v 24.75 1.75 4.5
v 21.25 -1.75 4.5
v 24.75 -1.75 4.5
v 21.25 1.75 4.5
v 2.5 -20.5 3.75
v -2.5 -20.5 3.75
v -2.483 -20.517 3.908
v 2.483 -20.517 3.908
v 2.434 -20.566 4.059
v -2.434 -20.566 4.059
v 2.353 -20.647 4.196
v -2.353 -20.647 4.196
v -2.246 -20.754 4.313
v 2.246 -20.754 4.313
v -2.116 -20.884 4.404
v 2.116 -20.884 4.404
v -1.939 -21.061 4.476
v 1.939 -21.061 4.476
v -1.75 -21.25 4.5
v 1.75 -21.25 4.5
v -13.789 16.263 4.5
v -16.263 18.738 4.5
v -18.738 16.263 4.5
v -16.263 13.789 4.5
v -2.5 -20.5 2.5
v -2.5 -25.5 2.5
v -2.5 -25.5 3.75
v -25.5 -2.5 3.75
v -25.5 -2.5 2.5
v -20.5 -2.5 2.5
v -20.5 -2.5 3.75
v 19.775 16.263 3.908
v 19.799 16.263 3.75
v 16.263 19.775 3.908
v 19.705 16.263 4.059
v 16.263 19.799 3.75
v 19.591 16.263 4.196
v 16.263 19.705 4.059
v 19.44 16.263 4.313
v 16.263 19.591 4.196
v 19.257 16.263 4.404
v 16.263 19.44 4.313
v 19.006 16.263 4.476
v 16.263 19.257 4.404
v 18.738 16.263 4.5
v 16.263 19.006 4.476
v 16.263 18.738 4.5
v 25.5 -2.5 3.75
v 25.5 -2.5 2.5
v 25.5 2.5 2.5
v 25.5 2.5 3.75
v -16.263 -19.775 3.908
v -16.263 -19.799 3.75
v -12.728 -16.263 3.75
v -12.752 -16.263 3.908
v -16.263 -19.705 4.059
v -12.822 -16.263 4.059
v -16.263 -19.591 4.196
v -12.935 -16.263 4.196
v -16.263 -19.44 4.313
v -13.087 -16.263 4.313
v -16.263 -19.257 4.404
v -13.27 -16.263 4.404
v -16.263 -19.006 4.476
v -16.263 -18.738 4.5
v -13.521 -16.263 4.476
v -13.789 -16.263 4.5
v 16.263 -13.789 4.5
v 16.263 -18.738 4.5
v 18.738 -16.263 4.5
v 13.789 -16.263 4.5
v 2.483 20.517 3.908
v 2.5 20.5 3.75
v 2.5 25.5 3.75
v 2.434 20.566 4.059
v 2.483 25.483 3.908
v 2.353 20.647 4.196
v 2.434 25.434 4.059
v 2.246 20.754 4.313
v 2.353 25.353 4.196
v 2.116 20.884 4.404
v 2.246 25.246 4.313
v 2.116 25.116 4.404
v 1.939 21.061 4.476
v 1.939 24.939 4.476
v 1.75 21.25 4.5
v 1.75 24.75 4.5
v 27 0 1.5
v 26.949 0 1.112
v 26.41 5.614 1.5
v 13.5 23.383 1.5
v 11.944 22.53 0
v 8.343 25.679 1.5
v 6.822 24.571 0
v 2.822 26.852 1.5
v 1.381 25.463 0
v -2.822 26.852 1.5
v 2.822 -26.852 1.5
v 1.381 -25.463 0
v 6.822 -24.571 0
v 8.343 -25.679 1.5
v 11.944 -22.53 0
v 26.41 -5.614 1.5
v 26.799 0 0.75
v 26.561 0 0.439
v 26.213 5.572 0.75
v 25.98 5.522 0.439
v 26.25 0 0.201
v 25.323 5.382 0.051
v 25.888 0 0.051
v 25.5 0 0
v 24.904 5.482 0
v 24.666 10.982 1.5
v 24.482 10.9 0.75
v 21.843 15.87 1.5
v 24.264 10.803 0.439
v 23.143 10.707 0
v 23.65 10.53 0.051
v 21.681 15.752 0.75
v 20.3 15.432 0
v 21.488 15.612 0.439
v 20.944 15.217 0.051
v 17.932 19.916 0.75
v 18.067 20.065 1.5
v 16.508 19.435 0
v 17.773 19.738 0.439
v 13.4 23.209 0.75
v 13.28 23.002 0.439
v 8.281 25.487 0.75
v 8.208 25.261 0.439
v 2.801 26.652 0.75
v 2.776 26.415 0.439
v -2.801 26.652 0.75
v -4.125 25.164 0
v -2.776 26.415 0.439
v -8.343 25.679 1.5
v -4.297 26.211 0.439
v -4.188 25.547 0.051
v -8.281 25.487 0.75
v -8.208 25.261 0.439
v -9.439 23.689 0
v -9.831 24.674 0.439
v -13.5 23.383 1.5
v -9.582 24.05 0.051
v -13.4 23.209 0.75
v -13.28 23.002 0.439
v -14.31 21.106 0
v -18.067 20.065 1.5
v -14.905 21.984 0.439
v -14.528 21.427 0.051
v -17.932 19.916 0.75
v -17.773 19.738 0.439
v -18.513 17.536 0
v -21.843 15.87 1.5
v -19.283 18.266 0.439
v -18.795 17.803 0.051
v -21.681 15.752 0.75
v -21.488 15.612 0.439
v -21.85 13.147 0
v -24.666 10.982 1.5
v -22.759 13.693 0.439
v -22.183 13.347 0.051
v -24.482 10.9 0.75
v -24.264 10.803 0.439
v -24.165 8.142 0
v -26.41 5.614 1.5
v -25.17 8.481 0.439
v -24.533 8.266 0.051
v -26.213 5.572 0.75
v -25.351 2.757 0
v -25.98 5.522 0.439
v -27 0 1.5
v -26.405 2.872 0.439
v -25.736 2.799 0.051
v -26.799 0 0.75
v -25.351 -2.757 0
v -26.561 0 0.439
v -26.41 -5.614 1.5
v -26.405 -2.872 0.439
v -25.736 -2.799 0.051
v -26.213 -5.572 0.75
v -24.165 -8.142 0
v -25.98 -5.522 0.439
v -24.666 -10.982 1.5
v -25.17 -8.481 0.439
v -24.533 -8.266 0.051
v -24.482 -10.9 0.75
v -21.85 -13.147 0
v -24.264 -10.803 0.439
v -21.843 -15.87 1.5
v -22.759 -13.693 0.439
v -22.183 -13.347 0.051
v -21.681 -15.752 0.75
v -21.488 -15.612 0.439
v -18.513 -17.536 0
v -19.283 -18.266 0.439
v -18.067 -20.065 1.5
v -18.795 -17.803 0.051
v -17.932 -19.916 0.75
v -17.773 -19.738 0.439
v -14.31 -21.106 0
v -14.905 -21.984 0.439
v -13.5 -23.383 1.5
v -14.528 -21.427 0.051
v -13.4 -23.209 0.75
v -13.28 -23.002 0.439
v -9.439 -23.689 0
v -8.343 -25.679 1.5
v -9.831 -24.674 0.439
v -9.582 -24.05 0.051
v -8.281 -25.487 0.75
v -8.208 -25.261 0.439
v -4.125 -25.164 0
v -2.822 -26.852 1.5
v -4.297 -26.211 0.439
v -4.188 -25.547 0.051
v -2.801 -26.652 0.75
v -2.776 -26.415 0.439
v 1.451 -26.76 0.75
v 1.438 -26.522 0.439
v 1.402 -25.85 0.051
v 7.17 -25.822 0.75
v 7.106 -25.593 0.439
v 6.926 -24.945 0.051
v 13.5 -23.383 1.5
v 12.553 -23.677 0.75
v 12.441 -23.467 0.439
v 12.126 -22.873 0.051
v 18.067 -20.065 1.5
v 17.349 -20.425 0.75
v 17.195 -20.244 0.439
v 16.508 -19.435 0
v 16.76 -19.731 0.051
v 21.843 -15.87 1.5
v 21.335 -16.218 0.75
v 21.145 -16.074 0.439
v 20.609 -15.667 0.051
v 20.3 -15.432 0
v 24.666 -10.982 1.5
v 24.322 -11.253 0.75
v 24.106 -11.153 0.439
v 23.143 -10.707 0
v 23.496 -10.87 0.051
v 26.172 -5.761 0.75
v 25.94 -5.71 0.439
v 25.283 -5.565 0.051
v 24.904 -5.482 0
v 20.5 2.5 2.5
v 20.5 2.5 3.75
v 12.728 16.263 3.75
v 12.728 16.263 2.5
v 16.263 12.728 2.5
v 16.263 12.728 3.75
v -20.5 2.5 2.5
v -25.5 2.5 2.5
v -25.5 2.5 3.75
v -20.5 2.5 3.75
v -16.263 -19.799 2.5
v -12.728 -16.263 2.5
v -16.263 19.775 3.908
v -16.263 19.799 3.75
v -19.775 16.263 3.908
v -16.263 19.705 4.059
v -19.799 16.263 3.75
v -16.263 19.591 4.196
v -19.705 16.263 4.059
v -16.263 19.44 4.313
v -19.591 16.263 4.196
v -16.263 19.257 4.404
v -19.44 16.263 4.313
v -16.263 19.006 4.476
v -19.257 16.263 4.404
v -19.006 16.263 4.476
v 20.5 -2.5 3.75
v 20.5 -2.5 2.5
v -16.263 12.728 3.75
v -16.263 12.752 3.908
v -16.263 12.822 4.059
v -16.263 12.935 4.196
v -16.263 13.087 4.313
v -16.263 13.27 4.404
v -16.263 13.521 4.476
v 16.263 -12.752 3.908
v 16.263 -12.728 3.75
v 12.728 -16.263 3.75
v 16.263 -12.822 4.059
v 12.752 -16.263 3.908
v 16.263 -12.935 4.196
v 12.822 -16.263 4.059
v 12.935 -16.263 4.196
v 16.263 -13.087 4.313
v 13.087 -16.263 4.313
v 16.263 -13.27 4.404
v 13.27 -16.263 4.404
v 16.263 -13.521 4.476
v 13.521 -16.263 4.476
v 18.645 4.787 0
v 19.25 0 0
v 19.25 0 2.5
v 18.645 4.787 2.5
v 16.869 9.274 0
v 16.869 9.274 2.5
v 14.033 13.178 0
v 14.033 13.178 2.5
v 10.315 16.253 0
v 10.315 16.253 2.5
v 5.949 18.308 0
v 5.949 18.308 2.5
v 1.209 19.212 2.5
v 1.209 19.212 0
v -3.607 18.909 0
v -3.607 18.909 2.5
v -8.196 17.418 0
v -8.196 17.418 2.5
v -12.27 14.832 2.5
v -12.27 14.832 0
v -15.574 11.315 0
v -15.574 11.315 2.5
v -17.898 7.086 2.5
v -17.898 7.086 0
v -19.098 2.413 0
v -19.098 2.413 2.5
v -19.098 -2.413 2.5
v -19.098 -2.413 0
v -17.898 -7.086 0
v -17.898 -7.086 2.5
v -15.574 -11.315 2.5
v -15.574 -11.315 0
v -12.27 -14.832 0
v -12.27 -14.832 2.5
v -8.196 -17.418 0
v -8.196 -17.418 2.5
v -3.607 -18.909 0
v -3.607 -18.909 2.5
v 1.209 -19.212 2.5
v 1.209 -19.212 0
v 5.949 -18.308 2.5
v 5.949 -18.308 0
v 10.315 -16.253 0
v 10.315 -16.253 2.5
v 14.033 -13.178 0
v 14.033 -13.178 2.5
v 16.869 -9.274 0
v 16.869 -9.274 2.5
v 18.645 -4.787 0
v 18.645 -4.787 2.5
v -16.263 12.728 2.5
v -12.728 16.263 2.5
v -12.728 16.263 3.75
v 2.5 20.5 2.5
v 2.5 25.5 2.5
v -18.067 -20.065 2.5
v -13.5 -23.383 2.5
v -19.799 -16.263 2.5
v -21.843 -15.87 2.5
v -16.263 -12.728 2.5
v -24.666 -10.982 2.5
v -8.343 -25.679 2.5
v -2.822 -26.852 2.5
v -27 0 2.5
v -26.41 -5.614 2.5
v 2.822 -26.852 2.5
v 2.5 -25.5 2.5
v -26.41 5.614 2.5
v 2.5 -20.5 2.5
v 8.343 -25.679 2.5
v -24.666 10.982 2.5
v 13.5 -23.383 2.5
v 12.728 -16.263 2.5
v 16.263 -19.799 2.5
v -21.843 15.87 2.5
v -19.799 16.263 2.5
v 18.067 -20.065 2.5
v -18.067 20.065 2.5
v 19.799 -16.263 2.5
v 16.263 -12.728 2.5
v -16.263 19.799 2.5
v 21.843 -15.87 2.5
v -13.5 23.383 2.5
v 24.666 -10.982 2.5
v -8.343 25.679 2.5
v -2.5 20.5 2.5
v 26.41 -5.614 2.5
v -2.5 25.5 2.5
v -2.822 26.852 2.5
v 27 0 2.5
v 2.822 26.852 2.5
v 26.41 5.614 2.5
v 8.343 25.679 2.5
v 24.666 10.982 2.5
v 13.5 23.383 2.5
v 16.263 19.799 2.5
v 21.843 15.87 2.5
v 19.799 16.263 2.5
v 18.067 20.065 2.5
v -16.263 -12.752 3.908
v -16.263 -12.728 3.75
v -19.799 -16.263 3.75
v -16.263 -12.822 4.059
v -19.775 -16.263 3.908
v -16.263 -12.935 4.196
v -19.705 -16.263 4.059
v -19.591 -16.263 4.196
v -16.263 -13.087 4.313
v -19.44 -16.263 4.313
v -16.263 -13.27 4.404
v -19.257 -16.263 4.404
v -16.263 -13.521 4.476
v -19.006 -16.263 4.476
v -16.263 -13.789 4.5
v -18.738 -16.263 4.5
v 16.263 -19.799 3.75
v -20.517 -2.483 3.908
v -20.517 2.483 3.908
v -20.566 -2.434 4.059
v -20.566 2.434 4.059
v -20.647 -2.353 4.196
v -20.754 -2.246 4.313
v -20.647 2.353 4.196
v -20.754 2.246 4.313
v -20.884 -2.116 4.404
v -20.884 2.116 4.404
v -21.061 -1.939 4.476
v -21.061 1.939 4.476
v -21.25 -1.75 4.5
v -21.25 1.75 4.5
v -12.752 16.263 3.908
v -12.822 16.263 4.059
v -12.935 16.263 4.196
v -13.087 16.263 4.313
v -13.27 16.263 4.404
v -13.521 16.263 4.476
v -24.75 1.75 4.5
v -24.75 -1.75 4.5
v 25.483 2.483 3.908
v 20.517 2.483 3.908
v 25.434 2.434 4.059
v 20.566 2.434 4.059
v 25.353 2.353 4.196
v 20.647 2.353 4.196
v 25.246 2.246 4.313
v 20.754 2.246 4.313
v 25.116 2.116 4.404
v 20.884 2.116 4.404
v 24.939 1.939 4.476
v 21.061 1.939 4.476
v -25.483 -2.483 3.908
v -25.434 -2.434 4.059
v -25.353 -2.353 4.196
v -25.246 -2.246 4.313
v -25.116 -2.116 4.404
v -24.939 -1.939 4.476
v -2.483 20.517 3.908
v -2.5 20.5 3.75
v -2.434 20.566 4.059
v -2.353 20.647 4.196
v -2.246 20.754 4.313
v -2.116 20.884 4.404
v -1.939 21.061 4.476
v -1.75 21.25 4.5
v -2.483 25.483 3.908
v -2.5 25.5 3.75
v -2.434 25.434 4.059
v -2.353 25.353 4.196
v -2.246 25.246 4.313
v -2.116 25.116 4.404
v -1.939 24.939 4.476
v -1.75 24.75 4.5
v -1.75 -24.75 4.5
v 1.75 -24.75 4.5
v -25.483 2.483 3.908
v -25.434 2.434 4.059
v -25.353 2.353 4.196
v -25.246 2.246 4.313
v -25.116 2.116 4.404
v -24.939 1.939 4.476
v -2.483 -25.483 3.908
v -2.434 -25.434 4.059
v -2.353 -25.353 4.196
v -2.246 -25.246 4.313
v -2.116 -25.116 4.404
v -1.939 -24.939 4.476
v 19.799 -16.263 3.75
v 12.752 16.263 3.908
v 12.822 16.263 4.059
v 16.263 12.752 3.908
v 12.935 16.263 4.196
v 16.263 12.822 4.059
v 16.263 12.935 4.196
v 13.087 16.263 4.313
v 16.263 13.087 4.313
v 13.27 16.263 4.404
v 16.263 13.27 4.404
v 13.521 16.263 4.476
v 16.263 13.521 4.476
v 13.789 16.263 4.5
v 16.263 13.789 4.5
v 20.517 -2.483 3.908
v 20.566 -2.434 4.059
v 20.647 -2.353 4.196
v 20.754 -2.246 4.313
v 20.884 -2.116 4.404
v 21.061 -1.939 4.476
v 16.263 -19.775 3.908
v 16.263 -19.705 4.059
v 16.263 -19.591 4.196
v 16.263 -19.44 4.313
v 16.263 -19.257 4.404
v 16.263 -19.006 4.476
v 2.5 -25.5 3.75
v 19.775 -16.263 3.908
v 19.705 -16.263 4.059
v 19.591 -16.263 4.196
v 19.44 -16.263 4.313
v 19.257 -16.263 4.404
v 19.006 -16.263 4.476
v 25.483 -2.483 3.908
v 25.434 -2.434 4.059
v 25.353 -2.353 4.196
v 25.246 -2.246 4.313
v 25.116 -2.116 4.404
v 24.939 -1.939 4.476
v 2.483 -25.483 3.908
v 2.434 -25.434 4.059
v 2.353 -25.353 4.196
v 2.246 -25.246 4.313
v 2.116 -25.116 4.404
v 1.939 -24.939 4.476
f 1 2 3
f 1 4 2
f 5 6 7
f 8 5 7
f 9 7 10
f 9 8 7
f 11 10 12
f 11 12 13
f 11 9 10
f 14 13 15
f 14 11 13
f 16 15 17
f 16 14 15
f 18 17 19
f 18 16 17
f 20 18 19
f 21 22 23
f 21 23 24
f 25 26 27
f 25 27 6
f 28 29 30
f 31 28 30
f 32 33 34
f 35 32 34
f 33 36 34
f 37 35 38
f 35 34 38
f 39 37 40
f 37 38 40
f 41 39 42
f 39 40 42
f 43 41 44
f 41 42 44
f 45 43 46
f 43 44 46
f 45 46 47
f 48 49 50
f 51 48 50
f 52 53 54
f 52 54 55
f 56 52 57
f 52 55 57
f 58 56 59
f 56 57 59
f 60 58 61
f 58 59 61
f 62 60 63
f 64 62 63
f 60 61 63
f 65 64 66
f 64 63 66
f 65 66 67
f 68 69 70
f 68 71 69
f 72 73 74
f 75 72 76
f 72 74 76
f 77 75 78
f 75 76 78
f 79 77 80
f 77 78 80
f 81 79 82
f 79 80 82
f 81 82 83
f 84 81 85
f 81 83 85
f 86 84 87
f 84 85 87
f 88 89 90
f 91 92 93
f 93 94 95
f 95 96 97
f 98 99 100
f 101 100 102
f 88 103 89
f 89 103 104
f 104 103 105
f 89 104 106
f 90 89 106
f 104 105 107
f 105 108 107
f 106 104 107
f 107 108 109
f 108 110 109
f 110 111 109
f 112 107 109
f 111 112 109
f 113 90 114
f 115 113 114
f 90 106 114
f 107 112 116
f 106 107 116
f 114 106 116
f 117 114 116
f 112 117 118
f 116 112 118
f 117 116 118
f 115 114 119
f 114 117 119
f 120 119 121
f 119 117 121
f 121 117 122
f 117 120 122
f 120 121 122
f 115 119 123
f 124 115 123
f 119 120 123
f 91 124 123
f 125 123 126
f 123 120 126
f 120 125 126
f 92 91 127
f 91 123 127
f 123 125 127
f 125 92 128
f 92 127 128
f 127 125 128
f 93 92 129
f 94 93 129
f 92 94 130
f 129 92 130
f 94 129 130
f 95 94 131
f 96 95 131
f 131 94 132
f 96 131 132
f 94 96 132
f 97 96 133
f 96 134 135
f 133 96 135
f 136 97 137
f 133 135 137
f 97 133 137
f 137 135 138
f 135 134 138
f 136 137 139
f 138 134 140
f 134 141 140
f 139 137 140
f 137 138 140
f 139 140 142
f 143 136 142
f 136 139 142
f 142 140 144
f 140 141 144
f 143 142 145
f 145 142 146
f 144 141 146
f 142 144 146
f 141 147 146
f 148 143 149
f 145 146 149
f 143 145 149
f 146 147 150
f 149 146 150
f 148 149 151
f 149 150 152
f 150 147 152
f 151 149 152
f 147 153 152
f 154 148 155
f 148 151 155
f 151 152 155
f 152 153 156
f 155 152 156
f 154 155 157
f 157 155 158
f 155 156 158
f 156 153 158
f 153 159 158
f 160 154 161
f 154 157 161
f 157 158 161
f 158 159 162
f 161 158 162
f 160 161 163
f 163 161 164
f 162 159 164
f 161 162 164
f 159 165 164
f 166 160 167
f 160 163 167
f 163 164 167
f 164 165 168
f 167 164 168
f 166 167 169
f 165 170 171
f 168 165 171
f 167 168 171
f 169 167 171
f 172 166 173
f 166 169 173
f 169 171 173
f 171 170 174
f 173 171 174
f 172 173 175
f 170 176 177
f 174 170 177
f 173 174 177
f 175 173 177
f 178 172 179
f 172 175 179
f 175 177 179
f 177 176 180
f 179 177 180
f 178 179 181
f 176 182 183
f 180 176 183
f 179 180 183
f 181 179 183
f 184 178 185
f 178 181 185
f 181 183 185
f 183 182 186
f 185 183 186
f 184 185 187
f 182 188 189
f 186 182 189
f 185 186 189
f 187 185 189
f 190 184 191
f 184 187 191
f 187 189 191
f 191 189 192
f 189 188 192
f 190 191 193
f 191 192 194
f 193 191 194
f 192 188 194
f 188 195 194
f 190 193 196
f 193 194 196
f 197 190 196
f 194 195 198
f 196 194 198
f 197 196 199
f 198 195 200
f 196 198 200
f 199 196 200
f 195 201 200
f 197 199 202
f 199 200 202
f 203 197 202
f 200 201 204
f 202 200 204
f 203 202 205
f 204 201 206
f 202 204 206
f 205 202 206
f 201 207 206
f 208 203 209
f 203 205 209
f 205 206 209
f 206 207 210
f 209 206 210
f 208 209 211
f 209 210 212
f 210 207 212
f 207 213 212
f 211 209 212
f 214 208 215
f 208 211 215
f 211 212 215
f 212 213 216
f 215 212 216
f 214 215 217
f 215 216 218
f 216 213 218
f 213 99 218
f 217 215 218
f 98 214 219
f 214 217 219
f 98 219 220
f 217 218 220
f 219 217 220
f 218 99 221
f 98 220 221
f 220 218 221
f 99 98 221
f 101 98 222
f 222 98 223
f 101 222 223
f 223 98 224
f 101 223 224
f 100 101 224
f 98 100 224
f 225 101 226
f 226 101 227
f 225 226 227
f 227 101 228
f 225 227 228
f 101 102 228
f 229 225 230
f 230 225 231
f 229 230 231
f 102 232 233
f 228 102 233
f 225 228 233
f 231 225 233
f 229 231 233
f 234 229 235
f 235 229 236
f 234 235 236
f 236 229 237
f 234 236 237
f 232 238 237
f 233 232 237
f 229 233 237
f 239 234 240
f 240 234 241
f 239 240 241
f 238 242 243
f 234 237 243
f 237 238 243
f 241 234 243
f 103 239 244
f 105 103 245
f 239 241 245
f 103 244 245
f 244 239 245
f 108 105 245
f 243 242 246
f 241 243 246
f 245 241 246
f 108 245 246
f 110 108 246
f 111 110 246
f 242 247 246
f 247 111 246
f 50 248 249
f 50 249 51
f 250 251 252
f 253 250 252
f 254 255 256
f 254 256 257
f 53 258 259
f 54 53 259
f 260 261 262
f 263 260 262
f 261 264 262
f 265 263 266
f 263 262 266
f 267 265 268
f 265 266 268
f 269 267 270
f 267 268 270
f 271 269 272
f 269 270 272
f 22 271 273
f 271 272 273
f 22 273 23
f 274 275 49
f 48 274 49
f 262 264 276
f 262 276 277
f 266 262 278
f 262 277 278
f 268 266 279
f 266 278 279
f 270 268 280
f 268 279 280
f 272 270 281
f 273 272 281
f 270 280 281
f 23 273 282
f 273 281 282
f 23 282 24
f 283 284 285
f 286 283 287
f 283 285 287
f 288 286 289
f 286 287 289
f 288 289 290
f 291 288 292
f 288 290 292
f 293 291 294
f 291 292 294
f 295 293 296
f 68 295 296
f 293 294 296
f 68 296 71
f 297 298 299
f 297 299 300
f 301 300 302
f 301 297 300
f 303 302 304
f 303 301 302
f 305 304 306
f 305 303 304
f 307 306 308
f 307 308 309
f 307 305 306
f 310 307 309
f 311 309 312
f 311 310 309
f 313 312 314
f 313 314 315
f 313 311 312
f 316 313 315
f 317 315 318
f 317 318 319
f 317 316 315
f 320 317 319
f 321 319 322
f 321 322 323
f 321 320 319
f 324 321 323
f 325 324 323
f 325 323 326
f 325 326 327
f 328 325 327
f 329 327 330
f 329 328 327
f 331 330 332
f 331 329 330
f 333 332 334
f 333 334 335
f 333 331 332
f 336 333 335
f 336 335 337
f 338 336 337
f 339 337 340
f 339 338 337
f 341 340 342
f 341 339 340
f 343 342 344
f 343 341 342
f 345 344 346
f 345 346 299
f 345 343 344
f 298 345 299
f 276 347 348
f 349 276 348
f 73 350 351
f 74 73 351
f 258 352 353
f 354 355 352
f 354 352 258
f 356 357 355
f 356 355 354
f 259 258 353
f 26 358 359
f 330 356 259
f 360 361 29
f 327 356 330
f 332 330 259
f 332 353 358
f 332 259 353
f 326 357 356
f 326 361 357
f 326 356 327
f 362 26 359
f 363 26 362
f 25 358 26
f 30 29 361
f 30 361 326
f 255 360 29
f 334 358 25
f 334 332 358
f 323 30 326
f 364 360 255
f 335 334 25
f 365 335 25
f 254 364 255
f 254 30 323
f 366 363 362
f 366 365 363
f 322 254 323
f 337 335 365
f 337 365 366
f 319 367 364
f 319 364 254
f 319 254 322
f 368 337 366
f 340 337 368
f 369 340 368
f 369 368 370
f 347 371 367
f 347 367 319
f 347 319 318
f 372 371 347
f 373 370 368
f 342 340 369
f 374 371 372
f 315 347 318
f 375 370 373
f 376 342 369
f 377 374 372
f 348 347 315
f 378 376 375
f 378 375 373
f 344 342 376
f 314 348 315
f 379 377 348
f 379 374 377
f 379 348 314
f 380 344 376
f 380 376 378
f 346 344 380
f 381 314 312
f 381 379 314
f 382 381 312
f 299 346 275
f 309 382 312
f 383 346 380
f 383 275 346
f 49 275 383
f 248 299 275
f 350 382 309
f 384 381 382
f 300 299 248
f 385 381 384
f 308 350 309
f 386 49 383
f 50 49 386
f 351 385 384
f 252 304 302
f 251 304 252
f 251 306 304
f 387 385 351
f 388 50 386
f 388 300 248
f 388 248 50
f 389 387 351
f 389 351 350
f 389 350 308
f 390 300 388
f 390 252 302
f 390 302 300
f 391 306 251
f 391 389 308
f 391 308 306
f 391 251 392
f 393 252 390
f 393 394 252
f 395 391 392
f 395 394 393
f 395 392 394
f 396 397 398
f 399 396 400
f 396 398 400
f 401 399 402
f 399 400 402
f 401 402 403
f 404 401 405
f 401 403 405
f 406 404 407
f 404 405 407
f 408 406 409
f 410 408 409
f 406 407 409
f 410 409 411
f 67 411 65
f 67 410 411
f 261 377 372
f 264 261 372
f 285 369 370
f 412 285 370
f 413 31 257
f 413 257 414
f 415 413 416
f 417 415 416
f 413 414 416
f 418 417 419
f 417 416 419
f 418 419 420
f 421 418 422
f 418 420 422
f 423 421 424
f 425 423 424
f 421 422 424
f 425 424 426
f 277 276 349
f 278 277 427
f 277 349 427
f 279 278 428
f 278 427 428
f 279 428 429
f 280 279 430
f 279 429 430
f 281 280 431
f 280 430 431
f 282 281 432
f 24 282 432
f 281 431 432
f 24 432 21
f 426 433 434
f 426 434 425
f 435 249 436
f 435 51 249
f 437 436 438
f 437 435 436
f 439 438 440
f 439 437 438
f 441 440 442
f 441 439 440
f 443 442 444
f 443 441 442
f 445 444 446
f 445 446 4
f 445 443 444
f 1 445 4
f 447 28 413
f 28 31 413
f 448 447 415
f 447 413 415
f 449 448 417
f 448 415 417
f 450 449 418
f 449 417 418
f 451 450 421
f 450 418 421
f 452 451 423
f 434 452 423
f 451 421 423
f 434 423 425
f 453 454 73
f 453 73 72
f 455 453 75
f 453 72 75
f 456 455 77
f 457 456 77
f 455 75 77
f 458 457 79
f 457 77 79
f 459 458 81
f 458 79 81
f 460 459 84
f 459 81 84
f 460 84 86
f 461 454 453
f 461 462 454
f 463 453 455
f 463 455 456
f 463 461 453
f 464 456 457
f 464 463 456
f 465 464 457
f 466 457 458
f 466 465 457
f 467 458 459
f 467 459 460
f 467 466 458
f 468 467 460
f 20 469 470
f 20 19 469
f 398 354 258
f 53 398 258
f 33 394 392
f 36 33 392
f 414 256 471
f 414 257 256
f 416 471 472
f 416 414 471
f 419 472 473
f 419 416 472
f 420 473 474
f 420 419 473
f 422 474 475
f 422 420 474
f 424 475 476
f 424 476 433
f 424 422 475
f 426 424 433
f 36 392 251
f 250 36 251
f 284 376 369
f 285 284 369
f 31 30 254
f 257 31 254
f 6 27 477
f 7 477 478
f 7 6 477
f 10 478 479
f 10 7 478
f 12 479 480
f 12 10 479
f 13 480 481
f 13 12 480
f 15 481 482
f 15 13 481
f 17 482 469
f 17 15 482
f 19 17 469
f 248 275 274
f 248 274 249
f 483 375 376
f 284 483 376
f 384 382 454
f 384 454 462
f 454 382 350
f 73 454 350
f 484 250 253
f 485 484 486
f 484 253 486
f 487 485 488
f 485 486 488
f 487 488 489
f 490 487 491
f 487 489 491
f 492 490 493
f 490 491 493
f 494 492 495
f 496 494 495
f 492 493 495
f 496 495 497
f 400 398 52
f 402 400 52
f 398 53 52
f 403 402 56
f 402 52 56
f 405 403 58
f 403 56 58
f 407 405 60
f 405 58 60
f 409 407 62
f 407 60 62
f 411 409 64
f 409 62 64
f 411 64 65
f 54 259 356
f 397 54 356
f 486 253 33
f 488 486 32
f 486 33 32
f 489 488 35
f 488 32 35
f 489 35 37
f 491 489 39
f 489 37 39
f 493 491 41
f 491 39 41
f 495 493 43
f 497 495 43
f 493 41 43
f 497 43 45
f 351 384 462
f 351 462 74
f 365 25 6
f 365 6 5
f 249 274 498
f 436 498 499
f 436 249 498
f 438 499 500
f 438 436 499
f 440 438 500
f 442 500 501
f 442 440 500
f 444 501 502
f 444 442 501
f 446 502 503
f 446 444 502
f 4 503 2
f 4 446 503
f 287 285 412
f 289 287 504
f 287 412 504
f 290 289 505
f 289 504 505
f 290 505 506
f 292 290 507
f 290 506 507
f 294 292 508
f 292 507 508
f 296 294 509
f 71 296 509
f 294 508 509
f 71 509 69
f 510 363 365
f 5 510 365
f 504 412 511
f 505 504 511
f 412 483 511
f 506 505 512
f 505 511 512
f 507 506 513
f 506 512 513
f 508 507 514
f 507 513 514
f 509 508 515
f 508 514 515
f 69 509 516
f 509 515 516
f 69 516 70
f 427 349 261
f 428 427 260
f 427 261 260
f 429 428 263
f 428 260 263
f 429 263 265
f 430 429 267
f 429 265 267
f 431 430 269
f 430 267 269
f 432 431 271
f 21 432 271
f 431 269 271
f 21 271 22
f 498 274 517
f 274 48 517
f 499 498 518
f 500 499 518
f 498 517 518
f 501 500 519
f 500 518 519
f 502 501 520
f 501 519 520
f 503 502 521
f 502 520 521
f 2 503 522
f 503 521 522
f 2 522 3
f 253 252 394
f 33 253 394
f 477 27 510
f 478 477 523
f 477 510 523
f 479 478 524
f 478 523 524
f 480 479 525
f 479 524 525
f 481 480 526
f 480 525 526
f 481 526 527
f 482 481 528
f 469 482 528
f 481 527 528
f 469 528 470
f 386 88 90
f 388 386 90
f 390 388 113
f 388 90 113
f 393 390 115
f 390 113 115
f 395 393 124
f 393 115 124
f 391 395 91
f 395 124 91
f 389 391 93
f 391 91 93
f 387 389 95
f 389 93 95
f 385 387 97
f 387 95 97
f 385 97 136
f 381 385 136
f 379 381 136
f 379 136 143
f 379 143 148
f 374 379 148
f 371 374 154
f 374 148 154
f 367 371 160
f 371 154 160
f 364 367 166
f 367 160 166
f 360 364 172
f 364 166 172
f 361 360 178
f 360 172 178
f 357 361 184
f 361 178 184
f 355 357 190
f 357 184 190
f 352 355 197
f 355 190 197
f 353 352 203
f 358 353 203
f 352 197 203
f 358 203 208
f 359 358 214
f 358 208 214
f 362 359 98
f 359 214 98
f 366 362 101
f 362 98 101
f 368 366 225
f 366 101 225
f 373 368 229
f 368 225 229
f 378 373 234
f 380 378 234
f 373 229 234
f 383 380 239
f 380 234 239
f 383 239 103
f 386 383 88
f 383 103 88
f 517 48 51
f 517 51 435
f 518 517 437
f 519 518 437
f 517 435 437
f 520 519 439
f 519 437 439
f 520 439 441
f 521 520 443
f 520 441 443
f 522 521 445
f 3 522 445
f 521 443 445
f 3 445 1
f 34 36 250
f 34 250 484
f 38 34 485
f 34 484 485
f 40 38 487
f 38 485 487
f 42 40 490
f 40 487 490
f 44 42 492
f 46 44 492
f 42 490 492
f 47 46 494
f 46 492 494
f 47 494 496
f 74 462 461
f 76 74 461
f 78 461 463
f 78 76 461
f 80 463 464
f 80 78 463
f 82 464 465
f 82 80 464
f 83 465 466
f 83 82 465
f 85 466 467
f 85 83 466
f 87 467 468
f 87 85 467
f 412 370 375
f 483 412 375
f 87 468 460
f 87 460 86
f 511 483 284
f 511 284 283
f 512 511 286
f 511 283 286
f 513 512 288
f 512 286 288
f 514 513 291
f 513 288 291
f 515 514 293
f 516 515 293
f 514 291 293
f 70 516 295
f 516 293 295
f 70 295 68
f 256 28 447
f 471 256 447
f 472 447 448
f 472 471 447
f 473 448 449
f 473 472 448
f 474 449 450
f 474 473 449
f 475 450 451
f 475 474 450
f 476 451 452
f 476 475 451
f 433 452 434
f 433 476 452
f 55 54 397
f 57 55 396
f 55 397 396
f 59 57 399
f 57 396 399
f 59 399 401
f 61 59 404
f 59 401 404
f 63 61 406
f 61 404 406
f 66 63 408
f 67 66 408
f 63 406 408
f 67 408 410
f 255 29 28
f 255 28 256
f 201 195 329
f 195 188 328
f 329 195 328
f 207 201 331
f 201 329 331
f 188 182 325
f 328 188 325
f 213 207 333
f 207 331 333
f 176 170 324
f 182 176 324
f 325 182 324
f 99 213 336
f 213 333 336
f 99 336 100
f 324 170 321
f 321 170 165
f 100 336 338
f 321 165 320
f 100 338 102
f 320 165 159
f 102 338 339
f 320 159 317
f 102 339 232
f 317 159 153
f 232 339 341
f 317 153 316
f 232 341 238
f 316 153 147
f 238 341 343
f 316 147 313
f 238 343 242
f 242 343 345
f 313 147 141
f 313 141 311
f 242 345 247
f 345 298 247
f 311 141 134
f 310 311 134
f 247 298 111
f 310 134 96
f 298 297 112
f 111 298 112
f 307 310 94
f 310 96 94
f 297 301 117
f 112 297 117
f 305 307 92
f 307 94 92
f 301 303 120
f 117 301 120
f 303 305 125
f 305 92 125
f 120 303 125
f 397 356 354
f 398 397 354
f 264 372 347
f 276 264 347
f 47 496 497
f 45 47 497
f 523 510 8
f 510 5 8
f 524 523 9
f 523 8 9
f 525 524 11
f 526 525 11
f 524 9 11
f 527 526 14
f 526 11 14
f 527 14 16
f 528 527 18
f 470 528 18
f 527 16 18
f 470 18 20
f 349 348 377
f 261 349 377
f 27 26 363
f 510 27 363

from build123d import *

# Parameters (mm, degrees)
F0_R     = 27
F0_R_2   = 19.25
F1_DEPTH = 2.5
F2_W     = 5
F2_H     = 5
F3_DEPTH = 2
F4_R     = 0.75
F5_R     = 1.5


with BuildPart() as f1:
    # F0 (on Top) → F1 (new body)
    with BuildSketch(Plane.XY):
        Circle(F0_R)
        Circle(F0_R_2, mode=Mode.SUBTRACT)
    extrude(amount=F1_DEPTH)

    # F2 (on face) → F3 (join)
    with BuildSketch(Plane.XY.offset(2.5)):
        with Locations((23, 0)):
            Rectangle(F2_W, F2_H)
        Polygon((19.79899, 16.263456), (16.263456, 19.79899), (12.727922, 16.263456), (16.263456, 12.727922), align=None)
        with Locations((0, 23)):
            Rectangle(F2_W, F2_H)
        Polygon((-16.263456, 19.79899), (-19.79899, 16.263456), (-16.263456, 12.727922), (-12.727922, 16.263456), align=None)
        with Locations((-23, 0)):
            Rectangle(F2_W, F2_H)
        Polygon((-19.79899, -16.263456), (-16.263456, -19.79899), (-12.727922, -16.263456), (-16.263456, -12.727922), align=None)
        with Locations((0, -23)):
            Rectangle(F2_W, F2_H)
        Polygon((16.263456, -19.79899), (19.79899, -16.263456), (16.263456, -12.727922), (12.727922, -16.263456), align=None)
    extrude(amount=F3_DEPTH)

    # F4
    f4_edges = [f1.edges().sort_by_distance(p)[0] for p in [
        (-25.5, 0, 4.5),
        (-23, -2.5, 4.5),
        (-20.5, 0, 4.5),
        (-23, 2.5, 4.5),
        (-18.031223, 18.031223, 4.5),
        (-18.031223, 14.495689, 4.5),
        (-14.495689, 14.495689, 4.5),
        (-14.495689, 18.031223, 4.5),
        (0, 25.5, 4.5),
        (-2.5, 23, 4.5),
        (0, 20.5, 4.5),
        (2.5, 23, 4.5),
        (18.031223, 18.031223, 4.5),
        (14.495689, 18.031223, 4.5),
        (14.495689, 14.495689, 4.5),
        (18.031223, 14.495689, 4.5),
        (23, -2.5, 4.5),
        (25.5, 0, 4.5),
        (23, 2.5, 4.5),
        (20.5, 0, 4.5),
        (18.031223, -18.031223, 4.5),
        (18.031223, -14.495689, 4.5),
        (14.495689, -14.495689, 4.5),
        (14.495689, -18.031223, 4.5),
        (0, -25.5, 4.5),
        (2.5, -23, 4.5),
        (0, -20.5, 4.5),
        (-2.5, -23, 4.5),
        (-18.031223, -18.031223, 4.5),
        (-14.495689, -18.031223, 4.5),
        (-14.495689, -14.495689, 4.5),
        (-18.031223, -14.495689, 4.5),
    ]]
    fillet(f4_edges, radius=F4_R)

    # F5
    f5_edges = [f1.edges().sort_by_distance(p)[0] for p in [
        (-27, 0, 0),
    ]]
    fillet(f5_edges, radius=F5_R)


solid = f1.part
